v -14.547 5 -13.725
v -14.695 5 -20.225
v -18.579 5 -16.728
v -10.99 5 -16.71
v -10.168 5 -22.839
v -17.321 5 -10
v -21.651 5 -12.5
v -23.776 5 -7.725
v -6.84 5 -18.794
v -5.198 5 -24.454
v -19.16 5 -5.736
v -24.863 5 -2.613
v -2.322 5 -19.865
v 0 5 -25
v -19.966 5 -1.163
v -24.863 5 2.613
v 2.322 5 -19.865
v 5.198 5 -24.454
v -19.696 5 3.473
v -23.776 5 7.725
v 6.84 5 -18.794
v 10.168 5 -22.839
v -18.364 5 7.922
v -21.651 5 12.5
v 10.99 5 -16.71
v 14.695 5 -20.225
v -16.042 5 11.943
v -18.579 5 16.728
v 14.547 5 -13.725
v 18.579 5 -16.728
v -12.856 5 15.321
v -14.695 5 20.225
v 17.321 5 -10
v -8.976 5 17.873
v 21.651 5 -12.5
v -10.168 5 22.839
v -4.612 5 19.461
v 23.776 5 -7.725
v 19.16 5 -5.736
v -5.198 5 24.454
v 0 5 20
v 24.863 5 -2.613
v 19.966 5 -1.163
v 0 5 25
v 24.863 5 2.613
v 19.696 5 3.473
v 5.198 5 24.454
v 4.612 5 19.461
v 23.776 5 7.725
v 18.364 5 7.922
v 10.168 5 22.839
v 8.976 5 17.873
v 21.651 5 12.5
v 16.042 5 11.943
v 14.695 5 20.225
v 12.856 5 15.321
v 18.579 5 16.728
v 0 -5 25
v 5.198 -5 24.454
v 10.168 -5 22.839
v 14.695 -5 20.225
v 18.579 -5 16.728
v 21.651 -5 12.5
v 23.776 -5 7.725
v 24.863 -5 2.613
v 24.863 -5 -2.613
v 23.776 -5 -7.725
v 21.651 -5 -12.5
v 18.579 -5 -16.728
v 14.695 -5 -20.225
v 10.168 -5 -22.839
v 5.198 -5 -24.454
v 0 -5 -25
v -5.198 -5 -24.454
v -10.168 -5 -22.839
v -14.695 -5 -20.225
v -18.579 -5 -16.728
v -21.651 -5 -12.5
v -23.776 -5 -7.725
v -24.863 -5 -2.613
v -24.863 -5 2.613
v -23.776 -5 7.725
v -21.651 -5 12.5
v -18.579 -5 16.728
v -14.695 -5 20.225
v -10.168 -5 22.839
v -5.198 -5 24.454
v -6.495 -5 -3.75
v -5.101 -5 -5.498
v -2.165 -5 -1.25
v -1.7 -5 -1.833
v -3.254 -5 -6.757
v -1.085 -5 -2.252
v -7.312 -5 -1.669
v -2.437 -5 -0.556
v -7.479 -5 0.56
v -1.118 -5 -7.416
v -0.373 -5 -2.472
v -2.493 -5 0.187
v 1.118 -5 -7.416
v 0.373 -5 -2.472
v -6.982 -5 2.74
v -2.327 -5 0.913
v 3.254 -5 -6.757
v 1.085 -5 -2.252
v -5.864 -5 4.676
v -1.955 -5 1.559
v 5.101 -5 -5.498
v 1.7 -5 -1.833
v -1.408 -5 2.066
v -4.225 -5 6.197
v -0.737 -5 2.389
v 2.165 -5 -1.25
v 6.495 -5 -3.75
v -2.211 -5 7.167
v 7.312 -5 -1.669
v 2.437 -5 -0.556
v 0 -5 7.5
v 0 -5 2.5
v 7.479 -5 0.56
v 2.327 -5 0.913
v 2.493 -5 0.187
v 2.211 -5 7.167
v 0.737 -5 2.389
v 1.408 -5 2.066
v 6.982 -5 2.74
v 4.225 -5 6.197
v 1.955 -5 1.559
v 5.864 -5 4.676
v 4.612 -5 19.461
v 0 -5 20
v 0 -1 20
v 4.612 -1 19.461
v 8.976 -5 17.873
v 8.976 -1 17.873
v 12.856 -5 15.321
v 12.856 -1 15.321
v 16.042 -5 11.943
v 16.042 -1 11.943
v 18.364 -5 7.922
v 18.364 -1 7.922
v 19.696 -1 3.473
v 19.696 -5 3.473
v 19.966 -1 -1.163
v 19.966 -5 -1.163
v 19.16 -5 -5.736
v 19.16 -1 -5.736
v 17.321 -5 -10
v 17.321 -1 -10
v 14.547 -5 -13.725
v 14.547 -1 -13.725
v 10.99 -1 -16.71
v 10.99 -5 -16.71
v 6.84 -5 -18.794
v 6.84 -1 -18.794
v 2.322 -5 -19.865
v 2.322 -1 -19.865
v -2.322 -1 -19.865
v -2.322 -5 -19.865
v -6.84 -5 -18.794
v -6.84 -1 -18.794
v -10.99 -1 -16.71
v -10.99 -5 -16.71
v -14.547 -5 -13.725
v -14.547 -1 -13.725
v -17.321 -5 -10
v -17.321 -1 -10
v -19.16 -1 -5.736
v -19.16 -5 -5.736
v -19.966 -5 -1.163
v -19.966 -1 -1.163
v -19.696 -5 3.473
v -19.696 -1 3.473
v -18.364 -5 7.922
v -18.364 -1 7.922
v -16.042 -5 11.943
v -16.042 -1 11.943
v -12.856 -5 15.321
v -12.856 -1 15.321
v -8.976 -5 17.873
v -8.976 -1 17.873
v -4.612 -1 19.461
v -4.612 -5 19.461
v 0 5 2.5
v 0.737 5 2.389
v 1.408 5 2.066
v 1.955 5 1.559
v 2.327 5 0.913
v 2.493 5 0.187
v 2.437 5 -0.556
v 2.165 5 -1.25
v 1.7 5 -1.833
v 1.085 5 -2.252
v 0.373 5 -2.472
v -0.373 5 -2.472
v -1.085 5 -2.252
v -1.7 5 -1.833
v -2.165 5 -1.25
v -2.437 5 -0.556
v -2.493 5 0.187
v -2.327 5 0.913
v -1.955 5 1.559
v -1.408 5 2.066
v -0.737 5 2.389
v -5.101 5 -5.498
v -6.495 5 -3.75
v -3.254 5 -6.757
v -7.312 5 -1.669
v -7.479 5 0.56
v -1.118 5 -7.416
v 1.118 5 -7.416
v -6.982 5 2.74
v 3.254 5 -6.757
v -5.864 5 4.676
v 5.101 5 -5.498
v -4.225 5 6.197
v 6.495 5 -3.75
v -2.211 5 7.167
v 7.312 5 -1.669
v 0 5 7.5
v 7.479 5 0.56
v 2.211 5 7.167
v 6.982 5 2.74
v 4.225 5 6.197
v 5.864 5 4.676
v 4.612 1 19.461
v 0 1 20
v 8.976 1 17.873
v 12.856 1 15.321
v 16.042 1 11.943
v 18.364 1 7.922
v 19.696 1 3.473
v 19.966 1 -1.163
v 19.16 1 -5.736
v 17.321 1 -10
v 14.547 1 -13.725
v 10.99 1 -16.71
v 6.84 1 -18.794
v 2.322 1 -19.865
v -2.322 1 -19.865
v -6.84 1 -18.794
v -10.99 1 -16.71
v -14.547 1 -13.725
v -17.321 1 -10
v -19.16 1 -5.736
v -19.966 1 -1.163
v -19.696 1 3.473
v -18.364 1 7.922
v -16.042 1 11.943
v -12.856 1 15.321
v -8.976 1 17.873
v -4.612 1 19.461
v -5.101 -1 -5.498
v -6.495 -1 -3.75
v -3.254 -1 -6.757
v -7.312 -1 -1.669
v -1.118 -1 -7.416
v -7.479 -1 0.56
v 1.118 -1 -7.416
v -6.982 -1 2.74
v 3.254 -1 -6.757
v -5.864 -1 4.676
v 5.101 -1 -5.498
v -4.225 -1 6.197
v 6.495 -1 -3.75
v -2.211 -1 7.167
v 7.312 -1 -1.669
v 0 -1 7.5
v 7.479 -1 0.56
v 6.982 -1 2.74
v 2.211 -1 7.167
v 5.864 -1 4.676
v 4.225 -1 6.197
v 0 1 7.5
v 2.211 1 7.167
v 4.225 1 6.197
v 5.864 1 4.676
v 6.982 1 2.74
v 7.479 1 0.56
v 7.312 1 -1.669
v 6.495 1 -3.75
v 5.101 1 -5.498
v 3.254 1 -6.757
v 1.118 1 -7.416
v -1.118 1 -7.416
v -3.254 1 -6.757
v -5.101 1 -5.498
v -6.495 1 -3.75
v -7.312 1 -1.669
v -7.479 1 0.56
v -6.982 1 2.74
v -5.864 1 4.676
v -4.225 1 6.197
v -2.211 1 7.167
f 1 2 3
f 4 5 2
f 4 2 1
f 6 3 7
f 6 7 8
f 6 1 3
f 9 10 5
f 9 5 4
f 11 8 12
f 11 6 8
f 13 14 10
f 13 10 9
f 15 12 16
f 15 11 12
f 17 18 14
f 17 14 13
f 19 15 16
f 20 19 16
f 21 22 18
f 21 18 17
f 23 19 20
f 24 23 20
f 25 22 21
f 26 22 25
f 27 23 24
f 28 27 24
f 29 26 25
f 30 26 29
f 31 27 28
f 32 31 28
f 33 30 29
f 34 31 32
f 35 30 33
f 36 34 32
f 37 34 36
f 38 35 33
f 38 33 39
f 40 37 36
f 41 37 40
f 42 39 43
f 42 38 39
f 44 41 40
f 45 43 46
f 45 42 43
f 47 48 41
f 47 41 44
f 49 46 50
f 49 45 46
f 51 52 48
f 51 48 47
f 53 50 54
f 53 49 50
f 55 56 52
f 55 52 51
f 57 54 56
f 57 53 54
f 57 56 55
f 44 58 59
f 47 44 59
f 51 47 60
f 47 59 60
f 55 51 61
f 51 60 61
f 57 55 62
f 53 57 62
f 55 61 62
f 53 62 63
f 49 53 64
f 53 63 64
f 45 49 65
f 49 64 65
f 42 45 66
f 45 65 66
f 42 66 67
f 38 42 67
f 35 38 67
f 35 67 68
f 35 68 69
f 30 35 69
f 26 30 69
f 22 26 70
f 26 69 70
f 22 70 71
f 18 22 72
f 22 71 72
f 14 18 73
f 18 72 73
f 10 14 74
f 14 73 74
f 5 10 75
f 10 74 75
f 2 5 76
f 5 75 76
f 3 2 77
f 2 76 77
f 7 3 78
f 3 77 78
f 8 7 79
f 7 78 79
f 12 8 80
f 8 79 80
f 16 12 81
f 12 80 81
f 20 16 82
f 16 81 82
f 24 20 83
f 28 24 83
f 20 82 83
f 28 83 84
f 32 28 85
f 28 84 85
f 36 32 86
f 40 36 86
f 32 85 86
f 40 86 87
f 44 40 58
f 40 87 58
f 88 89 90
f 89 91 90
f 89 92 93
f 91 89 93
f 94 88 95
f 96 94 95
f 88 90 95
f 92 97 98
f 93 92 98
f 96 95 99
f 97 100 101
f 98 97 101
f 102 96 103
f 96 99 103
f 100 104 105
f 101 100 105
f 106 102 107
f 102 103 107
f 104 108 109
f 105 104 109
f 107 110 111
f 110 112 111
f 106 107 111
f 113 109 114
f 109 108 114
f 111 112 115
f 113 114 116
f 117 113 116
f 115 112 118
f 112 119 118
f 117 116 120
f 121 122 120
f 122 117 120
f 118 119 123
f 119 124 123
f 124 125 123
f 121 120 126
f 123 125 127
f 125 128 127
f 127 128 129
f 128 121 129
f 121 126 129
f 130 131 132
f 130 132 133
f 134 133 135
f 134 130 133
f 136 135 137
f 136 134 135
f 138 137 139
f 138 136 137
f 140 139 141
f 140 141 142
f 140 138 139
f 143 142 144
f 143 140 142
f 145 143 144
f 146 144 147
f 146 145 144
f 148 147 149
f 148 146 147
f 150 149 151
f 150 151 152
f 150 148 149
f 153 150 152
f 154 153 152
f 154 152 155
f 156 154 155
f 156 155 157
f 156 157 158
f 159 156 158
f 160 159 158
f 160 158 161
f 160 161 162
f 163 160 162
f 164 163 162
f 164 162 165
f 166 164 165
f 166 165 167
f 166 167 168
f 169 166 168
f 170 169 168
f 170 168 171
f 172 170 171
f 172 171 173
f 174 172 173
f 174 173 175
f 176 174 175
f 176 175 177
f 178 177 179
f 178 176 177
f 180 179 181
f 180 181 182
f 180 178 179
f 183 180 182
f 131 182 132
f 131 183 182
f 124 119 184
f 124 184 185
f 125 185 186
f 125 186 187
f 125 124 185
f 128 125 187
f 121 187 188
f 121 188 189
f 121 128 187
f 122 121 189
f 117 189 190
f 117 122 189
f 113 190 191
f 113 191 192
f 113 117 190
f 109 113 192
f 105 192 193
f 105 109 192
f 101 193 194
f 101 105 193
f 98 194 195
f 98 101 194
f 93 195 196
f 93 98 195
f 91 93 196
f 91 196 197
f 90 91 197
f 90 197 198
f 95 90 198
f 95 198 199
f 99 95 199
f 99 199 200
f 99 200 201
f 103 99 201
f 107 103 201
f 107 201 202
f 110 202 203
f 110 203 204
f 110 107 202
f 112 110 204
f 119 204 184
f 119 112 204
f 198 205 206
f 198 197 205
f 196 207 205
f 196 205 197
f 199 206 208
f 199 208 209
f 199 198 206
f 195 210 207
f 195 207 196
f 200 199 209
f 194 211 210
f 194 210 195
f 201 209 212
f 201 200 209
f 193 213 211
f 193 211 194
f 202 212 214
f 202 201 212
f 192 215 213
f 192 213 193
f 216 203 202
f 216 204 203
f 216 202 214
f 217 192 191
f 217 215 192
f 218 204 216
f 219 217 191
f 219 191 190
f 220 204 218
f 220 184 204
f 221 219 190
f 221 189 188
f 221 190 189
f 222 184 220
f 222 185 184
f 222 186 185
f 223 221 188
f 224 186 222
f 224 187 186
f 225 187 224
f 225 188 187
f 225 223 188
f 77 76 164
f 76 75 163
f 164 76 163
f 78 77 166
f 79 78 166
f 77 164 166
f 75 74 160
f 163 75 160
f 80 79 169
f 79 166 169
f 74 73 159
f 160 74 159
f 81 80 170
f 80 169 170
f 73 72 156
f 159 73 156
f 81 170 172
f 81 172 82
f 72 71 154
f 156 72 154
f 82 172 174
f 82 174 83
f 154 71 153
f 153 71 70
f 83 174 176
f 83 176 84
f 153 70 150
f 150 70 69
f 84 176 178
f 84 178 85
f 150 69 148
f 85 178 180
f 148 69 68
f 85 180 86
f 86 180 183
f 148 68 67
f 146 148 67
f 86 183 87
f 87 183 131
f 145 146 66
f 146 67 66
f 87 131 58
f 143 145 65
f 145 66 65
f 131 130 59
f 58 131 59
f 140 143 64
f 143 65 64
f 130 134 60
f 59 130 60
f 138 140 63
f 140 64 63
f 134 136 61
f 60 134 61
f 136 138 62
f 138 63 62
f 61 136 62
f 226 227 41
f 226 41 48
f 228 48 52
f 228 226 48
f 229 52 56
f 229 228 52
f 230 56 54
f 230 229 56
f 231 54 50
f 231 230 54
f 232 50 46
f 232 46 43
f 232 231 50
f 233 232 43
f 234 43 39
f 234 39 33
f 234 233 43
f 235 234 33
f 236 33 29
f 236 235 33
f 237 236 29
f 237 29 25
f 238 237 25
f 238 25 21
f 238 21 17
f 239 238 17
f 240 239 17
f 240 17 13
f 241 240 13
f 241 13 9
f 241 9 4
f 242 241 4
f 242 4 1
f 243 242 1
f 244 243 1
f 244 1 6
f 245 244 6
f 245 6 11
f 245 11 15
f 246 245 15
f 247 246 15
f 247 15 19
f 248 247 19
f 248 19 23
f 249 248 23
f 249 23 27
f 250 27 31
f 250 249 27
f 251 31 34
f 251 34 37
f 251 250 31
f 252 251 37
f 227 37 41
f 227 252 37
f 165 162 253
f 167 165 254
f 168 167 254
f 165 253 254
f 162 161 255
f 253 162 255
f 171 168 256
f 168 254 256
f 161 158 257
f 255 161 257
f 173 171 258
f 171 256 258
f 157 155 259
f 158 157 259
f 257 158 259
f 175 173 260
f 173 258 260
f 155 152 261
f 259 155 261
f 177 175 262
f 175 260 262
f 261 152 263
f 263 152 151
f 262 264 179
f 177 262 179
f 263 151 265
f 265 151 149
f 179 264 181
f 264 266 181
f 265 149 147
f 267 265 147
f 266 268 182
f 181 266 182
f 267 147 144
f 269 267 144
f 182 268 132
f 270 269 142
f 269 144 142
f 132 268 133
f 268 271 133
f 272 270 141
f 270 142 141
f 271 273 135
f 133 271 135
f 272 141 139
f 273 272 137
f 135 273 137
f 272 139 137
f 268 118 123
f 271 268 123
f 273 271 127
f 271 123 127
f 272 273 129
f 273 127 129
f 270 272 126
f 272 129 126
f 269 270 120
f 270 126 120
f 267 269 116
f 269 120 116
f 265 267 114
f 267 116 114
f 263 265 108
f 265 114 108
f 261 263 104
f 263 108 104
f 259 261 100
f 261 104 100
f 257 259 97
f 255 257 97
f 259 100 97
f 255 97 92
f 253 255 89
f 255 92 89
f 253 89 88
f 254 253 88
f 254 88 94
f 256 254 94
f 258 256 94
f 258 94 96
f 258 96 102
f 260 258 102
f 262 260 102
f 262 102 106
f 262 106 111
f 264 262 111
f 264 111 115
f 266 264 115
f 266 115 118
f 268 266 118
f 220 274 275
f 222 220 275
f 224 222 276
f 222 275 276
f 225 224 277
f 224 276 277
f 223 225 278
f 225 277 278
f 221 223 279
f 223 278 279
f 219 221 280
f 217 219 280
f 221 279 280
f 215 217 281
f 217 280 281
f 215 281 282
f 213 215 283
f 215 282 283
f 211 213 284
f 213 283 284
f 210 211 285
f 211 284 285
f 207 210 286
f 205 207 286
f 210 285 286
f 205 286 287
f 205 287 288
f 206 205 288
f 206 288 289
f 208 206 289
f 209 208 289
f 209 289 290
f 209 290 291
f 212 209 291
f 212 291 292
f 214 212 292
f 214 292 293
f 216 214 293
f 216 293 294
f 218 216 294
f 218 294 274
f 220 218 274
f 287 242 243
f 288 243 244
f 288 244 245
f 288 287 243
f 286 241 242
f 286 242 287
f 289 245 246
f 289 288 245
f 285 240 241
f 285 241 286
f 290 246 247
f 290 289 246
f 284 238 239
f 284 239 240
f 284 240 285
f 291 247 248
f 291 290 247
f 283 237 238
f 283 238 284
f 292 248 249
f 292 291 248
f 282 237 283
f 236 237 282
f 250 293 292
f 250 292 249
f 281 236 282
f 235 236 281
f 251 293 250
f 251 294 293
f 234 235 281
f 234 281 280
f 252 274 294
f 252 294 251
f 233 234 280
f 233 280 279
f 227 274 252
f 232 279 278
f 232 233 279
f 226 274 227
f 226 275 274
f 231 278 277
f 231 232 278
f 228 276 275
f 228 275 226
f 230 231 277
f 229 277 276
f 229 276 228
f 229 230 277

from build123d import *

# Parameters (mm, degrees)
BOSS_EXTRUDE1_DEPTH        = 5
BOSS_EXTRUDE1_DEPTH_BACK   = 5
SKETCH1_R                  = 7.5
SKETCH1_R_2                = 2.5
BOSS_EXTRUDE1_2_DEPTH      = 5
BOSS_EXTRUDE1_2_DEPTH_BACK = 5
SKETCH1_R_3                = 25
SKETCH1_R_4                = 20
BOSS_EXTRUDE2_DEPTH        = 1
BOSS_EXTRUDE2_DEPTH_BACK   = 1
SKETCH1_3_R                = 20
SKETCH1_3_R_2              = 7.5


with BuildPart() as part:
    # Sketch1 → Boss-Extrude1 (new, two sides: drawn at the far end of the back side and taken through both)
    with BuildSketch(Plane(origin=(0, 0, 0), x_dir=(1, 0, 0), z_dir=(0, 1, 0)).offset(-BOSS_EXTRUDE1_DEPTH_BACK)):
        Circle(SKETCH1_R)
        Circle(SKETCH1_R_2, mode=Mode.SUBTRACT)
    extrude(amount=BOSS_EXTRUDE1_DEPTH + BOSS_EXTRUDE1_DEPTH_BACK)



with BuildPart() as body_2:
    # Sketch1 → Boss-Extrude1 2 (new, two sides: drawn at the far end of the back side and taken through both)
    with BuildSketch(Plane(origin=(0, 0, 0), x_dir=(1, 0, 0), z_dir=(0, 1, 0)).offset(-BOSS_EXTRUDE1_2_DEPTH_BACK)):
        Circle(SKETCH1_R_3)
        Circle(SKETCH1_R_4, mode=Mode.SUBTRACT)
    extrude(amount=BOSS_EXTRUDE1_2_DEPTH + BOSS_EXTRUDE1_2_DEPTH_BACK)


with BuildPart() as part_1:
    add(part.part)

    add(body_2.part)  # Boss-Extrude2 merges body 2
    # Sketch1<3> → Boss-Extrude2 (add, two sides: drawn at the far end of the back side and taken through both)
    with BuildSketch(Plane(origin=(0, 0, 0), x_dir=(1, 0, 0), z_dir=(0, 1, 0)).offset(-BOSS_EXTRUDE2_DEPTH_BACK)):
        Circle(SKETCH1_3_R)
        Circle(SKETCH1_3_R_2, mode=Mode.SUBTRACT)
    extrude(amount=BOSS_EXTRUDE2_DEPTH + BOSS_EXTRUDE2_DEPTH_BACK)


solid = part_1.part
